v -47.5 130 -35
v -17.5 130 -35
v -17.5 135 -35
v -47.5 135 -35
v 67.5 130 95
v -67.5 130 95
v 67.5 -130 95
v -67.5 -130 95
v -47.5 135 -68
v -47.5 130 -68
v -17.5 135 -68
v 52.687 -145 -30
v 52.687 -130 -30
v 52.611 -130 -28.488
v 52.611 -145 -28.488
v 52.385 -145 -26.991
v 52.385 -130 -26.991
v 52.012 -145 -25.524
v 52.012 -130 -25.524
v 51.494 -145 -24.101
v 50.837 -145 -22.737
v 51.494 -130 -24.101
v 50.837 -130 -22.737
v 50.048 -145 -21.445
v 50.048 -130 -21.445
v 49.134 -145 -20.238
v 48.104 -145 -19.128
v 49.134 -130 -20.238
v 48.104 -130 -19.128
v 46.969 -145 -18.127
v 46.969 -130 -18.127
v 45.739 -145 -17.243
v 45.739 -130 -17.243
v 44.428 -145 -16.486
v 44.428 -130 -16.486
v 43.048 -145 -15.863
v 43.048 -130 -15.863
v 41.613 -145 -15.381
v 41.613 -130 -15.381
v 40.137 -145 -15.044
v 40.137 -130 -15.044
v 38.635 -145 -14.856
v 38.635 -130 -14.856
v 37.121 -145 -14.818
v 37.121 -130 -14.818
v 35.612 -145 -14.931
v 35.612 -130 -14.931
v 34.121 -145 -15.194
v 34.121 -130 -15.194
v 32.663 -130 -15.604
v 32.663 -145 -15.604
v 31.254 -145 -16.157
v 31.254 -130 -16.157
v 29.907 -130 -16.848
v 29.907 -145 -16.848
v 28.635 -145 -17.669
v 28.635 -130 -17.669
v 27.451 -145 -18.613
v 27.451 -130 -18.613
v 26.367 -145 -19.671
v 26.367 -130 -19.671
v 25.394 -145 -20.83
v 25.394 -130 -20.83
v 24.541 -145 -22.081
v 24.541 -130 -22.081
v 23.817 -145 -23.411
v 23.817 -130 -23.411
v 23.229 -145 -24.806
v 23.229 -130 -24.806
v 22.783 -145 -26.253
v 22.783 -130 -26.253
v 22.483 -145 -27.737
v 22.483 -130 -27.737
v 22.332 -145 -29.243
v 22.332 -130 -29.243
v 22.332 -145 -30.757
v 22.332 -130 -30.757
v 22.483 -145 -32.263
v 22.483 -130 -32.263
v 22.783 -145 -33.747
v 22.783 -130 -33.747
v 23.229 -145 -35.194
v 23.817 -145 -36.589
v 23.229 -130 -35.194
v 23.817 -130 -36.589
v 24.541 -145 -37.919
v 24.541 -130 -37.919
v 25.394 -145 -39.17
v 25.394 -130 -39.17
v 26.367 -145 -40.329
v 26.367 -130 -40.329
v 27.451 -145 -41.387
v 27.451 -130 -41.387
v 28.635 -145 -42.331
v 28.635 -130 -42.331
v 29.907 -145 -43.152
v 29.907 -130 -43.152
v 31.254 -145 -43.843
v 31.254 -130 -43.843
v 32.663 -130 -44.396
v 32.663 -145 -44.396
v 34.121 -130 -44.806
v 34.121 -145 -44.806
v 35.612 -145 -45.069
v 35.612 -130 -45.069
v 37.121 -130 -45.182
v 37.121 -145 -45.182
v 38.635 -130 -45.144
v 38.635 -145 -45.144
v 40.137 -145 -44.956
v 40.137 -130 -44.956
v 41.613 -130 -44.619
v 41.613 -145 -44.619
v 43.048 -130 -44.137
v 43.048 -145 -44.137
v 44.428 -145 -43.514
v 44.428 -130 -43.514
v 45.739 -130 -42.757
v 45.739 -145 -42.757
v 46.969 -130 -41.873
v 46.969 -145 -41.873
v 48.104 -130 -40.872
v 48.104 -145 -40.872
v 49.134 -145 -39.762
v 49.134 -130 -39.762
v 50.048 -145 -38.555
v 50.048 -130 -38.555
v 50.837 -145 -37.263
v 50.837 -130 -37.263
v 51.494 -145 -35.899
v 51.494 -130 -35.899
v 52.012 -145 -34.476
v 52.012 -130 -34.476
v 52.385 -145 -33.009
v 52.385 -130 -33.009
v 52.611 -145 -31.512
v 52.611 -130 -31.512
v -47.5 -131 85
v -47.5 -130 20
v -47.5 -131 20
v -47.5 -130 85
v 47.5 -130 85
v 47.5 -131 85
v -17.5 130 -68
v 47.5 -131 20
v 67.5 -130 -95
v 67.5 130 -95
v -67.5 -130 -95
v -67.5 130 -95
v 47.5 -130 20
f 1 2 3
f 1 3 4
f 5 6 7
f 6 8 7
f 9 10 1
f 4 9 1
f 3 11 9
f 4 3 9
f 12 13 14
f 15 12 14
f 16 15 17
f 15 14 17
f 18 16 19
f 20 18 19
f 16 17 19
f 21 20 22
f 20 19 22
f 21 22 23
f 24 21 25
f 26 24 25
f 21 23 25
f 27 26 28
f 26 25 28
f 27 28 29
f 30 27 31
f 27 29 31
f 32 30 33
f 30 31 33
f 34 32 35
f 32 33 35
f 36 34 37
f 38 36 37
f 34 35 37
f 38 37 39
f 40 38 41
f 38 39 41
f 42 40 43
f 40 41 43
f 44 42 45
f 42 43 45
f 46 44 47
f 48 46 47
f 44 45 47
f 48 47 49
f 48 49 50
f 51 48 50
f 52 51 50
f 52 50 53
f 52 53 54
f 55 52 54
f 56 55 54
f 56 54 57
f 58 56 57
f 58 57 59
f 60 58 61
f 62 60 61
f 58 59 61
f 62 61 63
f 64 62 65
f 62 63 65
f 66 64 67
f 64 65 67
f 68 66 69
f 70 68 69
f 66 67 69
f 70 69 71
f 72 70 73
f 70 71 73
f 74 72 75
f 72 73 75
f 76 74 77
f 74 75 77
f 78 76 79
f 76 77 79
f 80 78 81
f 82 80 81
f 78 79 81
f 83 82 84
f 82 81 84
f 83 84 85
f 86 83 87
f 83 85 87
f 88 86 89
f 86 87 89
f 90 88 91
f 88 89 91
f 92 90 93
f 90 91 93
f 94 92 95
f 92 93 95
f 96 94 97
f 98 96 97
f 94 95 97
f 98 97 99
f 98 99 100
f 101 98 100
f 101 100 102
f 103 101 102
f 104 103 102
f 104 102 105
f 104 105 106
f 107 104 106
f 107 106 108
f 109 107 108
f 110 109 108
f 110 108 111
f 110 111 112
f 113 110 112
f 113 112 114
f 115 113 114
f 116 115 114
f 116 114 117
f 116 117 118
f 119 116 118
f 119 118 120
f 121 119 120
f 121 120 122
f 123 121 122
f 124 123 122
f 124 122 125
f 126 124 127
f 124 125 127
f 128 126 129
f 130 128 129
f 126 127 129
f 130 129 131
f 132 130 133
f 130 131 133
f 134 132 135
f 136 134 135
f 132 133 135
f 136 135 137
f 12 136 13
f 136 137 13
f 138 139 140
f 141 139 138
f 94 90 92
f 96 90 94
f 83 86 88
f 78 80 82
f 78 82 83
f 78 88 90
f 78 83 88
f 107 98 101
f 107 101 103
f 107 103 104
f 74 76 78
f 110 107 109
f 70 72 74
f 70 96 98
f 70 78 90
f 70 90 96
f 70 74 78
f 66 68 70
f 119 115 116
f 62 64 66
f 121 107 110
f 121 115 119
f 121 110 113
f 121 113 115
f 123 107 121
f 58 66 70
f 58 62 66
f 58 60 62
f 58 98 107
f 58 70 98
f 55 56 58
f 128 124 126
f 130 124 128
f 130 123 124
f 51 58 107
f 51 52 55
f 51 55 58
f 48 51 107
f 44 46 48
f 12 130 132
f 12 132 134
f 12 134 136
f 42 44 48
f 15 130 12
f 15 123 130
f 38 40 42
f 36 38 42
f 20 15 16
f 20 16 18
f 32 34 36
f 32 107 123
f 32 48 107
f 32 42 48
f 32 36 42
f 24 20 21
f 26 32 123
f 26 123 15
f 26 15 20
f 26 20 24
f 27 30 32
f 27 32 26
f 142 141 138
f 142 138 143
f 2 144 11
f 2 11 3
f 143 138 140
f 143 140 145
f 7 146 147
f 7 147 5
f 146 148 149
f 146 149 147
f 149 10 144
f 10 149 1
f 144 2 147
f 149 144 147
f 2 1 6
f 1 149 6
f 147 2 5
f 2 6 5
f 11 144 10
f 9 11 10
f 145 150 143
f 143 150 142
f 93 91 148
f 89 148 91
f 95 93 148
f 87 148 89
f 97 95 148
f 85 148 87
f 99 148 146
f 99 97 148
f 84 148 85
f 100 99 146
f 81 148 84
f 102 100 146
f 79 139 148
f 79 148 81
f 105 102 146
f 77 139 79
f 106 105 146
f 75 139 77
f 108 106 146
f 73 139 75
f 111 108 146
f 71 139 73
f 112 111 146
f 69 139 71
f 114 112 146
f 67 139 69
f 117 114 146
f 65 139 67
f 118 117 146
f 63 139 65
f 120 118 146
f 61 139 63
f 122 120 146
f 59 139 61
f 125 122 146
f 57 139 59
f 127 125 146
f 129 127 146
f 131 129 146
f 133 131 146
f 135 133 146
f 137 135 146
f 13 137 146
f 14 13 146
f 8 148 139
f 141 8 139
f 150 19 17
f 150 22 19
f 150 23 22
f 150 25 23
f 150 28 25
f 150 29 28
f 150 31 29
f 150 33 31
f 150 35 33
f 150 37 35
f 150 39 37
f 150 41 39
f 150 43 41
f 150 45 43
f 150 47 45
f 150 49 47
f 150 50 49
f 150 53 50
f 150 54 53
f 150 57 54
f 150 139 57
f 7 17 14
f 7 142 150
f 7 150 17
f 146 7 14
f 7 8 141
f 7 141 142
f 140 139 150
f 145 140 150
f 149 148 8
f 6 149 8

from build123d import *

# Parameters (mm, degrees)
F0_W     = 135
F0_H     = 190
F1_DEPTH = 130
F2_R     = 15.186523
F3_DEPTH = 15
F2_W     = 95
F2_H     = 65
F4_DEPTH = 1
F5_W     = 30
F5_H     = 33
F6_DEPTH = 5


with BuildPart() as f1:
    # F0 (on Front) → F1 (new body, symmetric)
    with BuildSketch(Plane.XZ):
        Rectangle(F0_W, F0_H)
    extrude(amount=F1_DEPTH, both=True)

    # F2 (on face) → F3 (join)
    with BuildSketch(Plane.XZ.offset(130)):
        with Locations((37.5, -30)):
            Circle(F2_R)
    extrude(amount=F3_DEPTH)

    # F2 (on face) → F4 (join)
    with BuildSketch(Plane.XZ.offset(130)):
        with Locations((0, 52.5)):
            Rectangle(F2_W, F2_H)
    extrude(amount=F4_DEPTH)

    # F5 (on face) → F6 (join)
    with BuildSketch(Plane(origin=(0, 130, 0), x_dir=(-1, 0, 0), z_dir=(0, 1, 0))):
        with Locations((32.5, -51.5)):
            Rectangle(F5_W, F5_H)
    extrude(amount=F6_DEPTH)


solid = f1.part
